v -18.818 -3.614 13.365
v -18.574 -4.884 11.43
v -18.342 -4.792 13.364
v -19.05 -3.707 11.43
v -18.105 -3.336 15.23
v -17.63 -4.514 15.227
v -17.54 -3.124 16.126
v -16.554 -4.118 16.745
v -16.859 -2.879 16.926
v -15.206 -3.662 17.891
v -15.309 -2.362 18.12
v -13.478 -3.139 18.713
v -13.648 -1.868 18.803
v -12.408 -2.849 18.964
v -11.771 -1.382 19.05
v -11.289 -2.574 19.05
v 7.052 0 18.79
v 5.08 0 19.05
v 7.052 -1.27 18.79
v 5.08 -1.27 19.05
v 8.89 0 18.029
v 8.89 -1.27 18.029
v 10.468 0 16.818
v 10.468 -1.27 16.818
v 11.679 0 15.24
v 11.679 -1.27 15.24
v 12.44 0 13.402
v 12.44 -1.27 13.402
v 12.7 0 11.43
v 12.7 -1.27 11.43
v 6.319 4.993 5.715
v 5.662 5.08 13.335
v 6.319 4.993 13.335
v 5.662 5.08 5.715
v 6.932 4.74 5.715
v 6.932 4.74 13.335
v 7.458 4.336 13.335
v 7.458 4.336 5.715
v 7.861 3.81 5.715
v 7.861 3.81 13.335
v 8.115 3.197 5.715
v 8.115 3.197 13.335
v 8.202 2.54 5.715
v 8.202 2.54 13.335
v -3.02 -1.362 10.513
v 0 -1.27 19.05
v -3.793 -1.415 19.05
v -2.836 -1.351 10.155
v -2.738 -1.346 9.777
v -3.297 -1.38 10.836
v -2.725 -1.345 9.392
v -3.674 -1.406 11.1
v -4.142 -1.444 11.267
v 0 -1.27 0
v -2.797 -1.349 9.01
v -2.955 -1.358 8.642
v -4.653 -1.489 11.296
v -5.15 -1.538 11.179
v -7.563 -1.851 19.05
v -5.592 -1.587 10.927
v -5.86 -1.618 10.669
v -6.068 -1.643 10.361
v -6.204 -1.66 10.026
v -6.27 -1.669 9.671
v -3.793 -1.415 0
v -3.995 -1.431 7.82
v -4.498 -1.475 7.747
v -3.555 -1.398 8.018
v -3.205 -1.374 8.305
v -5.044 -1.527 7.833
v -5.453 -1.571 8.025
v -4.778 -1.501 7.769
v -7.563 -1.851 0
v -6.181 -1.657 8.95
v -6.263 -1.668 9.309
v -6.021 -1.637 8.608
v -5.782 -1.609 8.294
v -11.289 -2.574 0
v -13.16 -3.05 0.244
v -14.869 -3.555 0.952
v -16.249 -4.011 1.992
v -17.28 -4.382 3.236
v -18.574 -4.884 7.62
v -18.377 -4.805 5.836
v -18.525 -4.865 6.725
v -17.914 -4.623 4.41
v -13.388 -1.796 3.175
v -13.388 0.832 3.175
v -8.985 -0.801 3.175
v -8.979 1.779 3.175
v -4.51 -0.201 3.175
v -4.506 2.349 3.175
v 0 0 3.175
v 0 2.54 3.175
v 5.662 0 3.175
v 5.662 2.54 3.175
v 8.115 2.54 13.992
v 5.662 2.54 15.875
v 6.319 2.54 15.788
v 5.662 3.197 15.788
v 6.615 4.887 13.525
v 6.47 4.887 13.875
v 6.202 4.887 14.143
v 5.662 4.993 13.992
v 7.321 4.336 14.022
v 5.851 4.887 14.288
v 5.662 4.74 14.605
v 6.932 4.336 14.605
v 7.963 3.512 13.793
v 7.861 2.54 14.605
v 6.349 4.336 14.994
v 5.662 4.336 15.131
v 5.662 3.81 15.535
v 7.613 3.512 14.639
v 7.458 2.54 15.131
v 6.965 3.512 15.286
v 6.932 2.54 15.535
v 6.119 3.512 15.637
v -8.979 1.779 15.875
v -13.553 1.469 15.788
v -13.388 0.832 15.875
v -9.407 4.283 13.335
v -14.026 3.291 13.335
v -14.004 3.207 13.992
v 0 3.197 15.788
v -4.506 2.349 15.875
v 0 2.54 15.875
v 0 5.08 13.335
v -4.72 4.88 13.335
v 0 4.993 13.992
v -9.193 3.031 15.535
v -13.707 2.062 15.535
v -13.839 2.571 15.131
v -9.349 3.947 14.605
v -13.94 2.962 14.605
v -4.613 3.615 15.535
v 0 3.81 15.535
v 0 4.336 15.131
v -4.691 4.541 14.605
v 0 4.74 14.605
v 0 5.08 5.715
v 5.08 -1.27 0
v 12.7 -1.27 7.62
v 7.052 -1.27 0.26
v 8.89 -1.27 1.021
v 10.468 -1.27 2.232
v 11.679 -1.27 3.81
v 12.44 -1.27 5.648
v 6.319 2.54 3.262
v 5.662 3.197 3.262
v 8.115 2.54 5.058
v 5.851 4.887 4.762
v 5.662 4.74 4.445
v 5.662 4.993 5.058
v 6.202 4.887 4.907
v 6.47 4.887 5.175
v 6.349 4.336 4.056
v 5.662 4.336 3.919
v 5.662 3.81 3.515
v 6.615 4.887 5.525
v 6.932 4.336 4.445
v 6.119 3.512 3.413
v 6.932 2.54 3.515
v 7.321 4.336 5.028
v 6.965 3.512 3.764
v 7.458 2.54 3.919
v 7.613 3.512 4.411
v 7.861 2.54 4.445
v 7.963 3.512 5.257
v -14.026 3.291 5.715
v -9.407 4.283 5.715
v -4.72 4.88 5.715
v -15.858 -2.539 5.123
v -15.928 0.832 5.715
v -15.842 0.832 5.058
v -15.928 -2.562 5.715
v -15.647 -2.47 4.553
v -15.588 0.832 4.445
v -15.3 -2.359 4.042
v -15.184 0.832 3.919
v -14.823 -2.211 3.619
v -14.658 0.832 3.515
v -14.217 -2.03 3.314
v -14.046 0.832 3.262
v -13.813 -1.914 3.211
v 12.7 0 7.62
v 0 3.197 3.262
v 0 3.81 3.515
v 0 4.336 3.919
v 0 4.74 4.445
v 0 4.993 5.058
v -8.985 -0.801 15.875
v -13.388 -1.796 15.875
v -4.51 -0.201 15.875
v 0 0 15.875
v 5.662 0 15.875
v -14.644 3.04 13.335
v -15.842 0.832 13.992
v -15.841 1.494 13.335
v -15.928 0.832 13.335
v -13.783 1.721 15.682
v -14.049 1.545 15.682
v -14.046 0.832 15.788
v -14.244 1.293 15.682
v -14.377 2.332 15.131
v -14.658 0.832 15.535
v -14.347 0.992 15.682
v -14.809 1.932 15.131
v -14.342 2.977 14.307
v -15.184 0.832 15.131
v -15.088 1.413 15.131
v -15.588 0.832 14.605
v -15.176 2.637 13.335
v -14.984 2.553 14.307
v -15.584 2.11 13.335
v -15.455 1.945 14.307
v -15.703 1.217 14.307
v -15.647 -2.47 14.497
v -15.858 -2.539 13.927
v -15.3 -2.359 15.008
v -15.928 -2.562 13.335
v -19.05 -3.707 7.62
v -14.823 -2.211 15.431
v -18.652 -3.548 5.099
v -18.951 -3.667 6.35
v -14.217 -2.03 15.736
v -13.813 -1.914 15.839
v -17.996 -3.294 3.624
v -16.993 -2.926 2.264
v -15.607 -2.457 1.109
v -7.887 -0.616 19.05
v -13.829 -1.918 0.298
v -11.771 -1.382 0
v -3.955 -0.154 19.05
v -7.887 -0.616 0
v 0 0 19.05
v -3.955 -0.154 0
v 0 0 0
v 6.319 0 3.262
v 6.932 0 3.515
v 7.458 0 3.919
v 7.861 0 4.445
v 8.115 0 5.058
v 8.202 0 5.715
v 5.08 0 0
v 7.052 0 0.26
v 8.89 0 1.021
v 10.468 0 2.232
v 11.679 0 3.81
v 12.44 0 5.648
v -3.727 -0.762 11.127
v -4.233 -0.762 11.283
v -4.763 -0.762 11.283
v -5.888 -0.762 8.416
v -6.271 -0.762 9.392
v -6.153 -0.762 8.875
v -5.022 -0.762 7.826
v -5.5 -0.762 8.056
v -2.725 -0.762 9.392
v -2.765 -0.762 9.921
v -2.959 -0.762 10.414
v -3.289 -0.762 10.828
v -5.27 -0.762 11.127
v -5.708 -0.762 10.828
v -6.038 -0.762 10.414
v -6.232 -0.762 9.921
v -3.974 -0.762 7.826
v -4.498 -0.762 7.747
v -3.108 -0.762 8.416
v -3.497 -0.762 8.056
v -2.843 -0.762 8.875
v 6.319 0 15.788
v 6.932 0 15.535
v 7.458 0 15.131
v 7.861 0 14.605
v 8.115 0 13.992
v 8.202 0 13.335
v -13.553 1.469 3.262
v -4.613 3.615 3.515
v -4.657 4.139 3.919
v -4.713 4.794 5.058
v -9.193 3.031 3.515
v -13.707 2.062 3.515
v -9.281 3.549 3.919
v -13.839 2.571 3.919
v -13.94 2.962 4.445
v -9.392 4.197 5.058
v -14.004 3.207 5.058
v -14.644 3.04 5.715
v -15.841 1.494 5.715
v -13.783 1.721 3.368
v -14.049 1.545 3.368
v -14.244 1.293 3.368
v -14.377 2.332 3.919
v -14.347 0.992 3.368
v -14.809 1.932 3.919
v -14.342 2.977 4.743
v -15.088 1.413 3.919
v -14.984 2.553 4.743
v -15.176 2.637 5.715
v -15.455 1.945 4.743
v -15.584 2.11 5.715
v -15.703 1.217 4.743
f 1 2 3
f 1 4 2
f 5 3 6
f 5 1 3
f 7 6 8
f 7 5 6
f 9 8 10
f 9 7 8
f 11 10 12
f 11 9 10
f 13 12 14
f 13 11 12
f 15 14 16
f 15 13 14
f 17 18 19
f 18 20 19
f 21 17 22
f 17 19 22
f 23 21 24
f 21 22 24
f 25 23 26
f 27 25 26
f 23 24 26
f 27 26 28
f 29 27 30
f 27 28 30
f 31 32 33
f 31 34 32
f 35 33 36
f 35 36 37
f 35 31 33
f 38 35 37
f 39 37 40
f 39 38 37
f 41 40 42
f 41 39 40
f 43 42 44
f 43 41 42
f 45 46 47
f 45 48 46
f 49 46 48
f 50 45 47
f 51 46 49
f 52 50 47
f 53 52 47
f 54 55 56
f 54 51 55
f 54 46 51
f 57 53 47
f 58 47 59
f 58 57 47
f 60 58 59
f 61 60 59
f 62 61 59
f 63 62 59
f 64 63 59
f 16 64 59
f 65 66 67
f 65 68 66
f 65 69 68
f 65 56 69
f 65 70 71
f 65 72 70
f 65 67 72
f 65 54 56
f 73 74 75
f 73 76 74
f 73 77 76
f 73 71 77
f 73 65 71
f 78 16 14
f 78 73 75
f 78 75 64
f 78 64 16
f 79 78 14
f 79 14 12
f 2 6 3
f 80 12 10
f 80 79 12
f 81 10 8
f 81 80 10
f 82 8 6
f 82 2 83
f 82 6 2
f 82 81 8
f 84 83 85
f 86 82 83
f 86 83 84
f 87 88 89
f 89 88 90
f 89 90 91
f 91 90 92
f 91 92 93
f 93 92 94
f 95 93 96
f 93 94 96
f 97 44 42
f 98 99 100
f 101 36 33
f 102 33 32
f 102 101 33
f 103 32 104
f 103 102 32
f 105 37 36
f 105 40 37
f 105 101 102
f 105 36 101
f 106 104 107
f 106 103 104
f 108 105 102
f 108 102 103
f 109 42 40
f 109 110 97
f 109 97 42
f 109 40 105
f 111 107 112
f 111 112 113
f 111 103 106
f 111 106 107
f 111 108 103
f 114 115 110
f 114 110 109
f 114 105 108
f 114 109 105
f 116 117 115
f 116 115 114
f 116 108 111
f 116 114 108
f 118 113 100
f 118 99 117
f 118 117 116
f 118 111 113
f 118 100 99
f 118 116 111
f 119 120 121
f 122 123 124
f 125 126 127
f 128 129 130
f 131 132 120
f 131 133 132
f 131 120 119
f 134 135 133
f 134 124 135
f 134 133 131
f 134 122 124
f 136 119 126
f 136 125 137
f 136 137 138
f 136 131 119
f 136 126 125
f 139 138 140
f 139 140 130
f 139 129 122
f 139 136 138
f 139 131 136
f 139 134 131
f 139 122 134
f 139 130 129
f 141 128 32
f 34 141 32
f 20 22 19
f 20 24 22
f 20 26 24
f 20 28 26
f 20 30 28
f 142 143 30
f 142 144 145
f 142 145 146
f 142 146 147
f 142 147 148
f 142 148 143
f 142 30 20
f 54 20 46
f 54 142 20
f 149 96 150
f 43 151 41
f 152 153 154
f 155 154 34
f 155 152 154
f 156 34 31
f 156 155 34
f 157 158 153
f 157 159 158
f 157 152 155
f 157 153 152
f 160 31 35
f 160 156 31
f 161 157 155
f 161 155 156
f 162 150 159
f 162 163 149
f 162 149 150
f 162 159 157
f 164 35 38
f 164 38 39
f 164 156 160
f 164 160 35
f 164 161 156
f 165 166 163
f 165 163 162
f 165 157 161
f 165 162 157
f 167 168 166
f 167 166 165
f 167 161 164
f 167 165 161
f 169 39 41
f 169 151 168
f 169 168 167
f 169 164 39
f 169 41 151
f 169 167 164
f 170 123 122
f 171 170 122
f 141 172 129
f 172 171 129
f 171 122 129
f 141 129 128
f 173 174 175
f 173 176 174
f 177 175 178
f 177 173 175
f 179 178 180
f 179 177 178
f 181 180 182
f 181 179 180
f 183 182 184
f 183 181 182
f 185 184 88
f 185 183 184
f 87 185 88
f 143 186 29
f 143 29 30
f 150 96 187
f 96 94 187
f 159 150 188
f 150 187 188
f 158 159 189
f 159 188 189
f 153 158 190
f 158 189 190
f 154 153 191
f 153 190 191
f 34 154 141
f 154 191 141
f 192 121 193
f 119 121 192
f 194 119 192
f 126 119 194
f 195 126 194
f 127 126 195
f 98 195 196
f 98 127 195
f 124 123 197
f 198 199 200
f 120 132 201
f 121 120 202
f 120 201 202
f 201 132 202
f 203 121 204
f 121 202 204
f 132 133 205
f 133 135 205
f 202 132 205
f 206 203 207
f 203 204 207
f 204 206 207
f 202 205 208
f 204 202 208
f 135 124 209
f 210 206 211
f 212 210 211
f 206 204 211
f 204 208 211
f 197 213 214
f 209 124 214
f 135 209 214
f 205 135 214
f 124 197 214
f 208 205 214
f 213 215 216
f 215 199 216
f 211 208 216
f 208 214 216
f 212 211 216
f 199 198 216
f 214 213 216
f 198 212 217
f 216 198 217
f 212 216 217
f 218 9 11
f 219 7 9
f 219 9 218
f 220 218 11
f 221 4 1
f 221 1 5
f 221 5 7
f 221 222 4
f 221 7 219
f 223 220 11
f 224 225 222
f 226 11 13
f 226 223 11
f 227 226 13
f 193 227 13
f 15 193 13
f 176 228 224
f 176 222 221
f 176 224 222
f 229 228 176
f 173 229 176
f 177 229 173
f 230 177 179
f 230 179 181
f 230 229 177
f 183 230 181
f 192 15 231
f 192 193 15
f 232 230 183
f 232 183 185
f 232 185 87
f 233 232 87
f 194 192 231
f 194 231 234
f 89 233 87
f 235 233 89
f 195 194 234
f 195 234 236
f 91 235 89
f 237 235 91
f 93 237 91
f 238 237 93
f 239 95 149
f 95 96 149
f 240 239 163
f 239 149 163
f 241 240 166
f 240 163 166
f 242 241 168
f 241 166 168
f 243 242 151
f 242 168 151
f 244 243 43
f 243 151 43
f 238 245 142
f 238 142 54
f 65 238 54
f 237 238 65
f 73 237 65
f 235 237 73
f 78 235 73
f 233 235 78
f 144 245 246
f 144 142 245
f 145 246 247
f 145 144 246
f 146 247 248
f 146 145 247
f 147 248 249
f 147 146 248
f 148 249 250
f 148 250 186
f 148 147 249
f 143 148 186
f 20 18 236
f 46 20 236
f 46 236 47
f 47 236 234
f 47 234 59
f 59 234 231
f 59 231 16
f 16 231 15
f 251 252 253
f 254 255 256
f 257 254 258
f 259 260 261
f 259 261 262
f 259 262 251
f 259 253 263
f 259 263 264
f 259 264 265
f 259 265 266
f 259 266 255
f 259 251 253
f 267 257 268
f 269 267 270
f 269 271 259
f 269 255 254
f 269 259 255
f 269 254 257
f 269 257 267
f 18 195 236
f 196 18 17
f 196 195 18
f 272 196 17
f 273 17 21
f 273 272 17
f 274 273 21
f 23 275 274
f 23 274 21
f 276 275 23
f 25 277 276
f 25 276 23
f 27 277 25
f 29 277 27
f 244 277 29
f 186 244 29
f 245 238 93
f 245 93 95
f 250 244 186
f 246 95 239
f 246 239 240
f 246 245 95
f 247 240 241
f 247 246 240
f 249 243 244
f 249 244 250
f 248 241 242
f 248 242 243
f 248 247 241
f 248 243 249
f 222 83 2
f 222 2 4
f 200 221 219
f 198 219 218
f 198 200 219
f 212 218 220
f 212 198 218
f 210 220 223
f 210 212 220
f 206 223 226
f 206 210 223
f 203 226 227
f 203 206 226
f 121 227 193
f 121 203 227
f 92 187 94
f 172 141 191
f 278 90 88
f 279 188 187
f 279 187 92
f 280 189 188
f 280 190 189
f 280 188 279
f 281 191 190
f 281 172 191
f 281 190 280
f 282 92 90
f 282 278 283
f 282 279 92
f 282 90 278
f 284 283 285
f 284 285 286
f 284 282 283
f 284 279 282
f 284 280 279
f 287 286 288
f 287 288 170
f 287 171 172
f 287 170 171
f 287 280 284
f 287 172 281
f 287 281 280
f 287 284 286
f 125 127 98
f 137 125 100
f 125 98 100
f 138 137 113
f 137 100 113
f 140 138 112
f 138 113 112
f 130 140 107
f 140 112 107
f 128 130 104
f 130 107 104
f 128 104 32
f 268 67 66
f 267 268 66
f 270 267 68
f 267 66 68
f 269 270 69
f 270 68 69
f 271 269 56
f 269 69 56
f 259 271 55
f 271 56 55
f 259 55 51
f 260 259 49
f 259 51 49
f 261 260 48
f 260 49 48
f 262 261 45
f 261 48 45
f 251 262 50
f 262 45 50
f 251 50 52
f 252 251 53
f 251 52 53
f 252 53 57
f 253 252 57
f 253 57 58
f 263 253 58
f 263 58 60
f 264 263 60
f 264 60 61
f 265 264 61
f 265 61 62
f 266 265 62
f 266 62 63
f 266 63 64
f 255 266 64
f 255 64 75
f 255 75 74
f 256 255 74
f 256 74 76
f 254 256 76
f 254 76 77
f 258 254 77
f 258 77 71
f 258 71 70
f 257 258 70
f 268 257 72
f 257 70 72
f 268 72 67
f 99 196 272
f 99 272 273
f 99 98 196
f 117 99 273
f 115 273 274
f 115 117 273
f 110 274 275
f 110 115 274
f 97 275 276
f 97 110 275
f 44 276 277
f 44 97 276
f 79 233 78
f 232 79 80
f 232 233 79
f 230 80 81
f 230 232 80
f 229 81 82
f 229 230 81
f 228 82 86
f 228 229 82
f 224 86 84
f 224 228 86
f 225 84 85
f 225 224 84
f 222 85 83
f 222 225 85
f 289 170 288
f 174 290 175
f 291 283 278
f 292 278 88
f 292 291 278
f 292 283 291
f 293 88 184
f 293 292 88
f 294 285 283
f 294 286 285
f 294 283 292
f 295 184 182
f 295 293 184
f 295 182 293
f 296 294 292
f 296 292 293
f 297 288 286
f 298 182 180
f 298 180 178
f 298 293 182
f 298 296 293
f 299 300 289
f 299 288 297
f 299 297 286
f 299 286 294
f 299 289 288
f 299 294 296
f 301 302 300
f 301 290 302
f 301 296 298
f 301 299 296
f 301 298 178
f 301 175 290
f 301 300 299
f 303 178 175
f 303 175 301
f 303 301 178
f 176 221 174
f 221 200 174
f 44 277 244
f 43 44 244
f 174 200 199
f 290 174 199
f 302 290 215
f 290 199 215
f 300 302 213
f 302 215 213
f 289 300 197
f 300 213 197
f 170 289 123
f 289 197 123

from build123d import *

# Parameters (mm, degrees)
BOSS_EXTRUDE3_DEPTH                  = 19.05
SKETCH5_R                            = 1.778
CUT_EXTRUDE1_DEPTH                   = 3.048
SKETCH7_W                            = 24.13
SKETCH7_H                            = 12.7
BOSS_EXTRUDE4_DEPTH                  = 6.35
BOSS_EXTRUDE4_DIRECTION_2_REACH      = 29.38
BOSS_EXTRUDE4_DIRECTION_2_END_RADIUS = 50.8
CUT_EXTRUDE2_DEPTH                   = 26.597668413
FILLET1_R                            = 2.54
FILLET2_R                            = 7.62


with BuildPart() as part:
    # Sketch3 → Boss-Extrude3 (new body)
    with BuildSketch(Plane.XY):
        with BuildLine():
            Line((0, 0), (12.7, 0))
            Line((12.7, 0), (12.7, -1.27))
            Line((12.7, -1.27), (0, -1.27))
            ThreePointArc((0, -1.27), (-9.461085009, -2.182011863), (-18.57375, -4.884461117))
            Line((-18.57375, -4.884461117), (-19.05, -3.707139607))
            ThreePointArc((-19.05, -3.707139607), (-9.703676933, -0.935396783), (0, 0))
        make_face()
    extrude(amount=BOSS_EXTRUDE3_DEPTH)

    # Sketch5 → Cut-Extrude1 (cut)
    with BuildSketch(Plane(origin=(0, -3.81, 0), x_dir=(-1, 0, 0), z_dir=(0, -1, 0))):
        with Locations(Location((4.49834, -9.525, 0), (0, 0, 90))):
            Circle(SKETCH5_R)
    extrude(amount=-CUT_EXTRUDE1_DEPTH, mode=Mode.SUBTRACT)

    # Sketch7 → Boss-Extrude4 (add)
    with BuildSketch(Plane(origin=(0, 0, 0), x_dir=(1, 0, 0), z_dir=(0, 1, 0))):
        with Locations((-3.86334, -9.525)):
            Rectangle(SKETCH7_W, SKETCH7_H)
    extrude(amount=BOSS_EXTRUDE4_DEPTH)

    # Boss-Extrude4 direction 2: up to this cylinder (the profile starts outside it)
    boss_extrude4_direction_2_end = Plane(origin=(0, -50.8, 9.525), z_dir=(0, 0, -1)) * Cylinder(BOSS_EXTRUDE4_DIRECTION_2_END_RADIUS, 161.36, mode=Mode.PRIVATE)
    # Sketch7 → Boss-Extrude4 direction 2 (add, up to the surface)
    with BuildSketch(Plane(origin=(0, 0, 0), x_dir=(1, 0, 0), z_dir=(0, 1, 0)), mode=Mode.PRIVATE) as boss_extrude4_direction_2_sk1:
        with Locations((-3.86334, -9.525)):
            Rectangle(SKETCH7_W, SKETCH7_H)
    boss_extrude4_direction_2_tool1 = extrude(boss_extrude4_direction_2_sk1.sketch, amount=-BOSS_EXTRUDE4_DIRECTION_2_REACH, mode=Mode.PRIVATE) - boss_extrude4_direction_2_end
    add(boss_extrude4_direction_2_tool1.solids().sort_by_distance((-3.86334, 0, 9.525))[0])
    add(boss_extrude4_direction_2_tool1.solids().sort_by_distance((-3.86334, 0, 9.525))[1])

    # Sketch8 → Cut-Extrude2 (cut, through all)
    with BuildSketch(Plane.XY.offset(15.875)):
        with BuildLine():
            Line((8.20166, 5.08), (8.20166, 6.35))
            Line((8.20166, 6.35), (-20.955, 6.35))
            Line((-20.955, 6.35), (-20.955, 1.002146432))
            ThreePointArc((-20.955, 1.002146432), (-10.674044626, 4.051063539), (0, 5.08))
            Line((0, 5.08), (8.20166, 5.08))
        make_face()
    extrude(amount=-CUT_EXTRUDE2_DEPTH, mode=Mode.SUBTRACT)

    # Fillet1
    fillet1_edges = [part.edges().sort_by_distance(p)[0] for p in [
        (-15.92834, 0.100002136, 3.175),
        (-15.92834, 0.100002136, 15.875),
        (8.20166, 2.54, 3.175),
        (8.20166, 2.54, 15.875),
        (-15.92834, 2.761762339, 9.525),
        (-8.048078047, 4.497403553, 3.175),
        (4.10083, 5.08, 3.175),
        (8.20166, 5.08, 9.525),
        (-8.048078047, 4.497403553, 15.875),
        (4.10083, 5.08, 15.875),
    ]]
    fillet(fillet1_edges, radius=FILLET1_R)

    # Fillet2
    fillet2_edges = [part.edges().sort_by_distance(p)[0] for p in [
        (-18.811875, -4.295800362, 19.05),
        (-18.811875, -4.295800362, 0),
        (12.7, -0.635, 19.05),
        (12.7, -0.635, 0),
    ]]
    fillet(fillet2_edges, radius=FILLET2_R)


solid = part.part
